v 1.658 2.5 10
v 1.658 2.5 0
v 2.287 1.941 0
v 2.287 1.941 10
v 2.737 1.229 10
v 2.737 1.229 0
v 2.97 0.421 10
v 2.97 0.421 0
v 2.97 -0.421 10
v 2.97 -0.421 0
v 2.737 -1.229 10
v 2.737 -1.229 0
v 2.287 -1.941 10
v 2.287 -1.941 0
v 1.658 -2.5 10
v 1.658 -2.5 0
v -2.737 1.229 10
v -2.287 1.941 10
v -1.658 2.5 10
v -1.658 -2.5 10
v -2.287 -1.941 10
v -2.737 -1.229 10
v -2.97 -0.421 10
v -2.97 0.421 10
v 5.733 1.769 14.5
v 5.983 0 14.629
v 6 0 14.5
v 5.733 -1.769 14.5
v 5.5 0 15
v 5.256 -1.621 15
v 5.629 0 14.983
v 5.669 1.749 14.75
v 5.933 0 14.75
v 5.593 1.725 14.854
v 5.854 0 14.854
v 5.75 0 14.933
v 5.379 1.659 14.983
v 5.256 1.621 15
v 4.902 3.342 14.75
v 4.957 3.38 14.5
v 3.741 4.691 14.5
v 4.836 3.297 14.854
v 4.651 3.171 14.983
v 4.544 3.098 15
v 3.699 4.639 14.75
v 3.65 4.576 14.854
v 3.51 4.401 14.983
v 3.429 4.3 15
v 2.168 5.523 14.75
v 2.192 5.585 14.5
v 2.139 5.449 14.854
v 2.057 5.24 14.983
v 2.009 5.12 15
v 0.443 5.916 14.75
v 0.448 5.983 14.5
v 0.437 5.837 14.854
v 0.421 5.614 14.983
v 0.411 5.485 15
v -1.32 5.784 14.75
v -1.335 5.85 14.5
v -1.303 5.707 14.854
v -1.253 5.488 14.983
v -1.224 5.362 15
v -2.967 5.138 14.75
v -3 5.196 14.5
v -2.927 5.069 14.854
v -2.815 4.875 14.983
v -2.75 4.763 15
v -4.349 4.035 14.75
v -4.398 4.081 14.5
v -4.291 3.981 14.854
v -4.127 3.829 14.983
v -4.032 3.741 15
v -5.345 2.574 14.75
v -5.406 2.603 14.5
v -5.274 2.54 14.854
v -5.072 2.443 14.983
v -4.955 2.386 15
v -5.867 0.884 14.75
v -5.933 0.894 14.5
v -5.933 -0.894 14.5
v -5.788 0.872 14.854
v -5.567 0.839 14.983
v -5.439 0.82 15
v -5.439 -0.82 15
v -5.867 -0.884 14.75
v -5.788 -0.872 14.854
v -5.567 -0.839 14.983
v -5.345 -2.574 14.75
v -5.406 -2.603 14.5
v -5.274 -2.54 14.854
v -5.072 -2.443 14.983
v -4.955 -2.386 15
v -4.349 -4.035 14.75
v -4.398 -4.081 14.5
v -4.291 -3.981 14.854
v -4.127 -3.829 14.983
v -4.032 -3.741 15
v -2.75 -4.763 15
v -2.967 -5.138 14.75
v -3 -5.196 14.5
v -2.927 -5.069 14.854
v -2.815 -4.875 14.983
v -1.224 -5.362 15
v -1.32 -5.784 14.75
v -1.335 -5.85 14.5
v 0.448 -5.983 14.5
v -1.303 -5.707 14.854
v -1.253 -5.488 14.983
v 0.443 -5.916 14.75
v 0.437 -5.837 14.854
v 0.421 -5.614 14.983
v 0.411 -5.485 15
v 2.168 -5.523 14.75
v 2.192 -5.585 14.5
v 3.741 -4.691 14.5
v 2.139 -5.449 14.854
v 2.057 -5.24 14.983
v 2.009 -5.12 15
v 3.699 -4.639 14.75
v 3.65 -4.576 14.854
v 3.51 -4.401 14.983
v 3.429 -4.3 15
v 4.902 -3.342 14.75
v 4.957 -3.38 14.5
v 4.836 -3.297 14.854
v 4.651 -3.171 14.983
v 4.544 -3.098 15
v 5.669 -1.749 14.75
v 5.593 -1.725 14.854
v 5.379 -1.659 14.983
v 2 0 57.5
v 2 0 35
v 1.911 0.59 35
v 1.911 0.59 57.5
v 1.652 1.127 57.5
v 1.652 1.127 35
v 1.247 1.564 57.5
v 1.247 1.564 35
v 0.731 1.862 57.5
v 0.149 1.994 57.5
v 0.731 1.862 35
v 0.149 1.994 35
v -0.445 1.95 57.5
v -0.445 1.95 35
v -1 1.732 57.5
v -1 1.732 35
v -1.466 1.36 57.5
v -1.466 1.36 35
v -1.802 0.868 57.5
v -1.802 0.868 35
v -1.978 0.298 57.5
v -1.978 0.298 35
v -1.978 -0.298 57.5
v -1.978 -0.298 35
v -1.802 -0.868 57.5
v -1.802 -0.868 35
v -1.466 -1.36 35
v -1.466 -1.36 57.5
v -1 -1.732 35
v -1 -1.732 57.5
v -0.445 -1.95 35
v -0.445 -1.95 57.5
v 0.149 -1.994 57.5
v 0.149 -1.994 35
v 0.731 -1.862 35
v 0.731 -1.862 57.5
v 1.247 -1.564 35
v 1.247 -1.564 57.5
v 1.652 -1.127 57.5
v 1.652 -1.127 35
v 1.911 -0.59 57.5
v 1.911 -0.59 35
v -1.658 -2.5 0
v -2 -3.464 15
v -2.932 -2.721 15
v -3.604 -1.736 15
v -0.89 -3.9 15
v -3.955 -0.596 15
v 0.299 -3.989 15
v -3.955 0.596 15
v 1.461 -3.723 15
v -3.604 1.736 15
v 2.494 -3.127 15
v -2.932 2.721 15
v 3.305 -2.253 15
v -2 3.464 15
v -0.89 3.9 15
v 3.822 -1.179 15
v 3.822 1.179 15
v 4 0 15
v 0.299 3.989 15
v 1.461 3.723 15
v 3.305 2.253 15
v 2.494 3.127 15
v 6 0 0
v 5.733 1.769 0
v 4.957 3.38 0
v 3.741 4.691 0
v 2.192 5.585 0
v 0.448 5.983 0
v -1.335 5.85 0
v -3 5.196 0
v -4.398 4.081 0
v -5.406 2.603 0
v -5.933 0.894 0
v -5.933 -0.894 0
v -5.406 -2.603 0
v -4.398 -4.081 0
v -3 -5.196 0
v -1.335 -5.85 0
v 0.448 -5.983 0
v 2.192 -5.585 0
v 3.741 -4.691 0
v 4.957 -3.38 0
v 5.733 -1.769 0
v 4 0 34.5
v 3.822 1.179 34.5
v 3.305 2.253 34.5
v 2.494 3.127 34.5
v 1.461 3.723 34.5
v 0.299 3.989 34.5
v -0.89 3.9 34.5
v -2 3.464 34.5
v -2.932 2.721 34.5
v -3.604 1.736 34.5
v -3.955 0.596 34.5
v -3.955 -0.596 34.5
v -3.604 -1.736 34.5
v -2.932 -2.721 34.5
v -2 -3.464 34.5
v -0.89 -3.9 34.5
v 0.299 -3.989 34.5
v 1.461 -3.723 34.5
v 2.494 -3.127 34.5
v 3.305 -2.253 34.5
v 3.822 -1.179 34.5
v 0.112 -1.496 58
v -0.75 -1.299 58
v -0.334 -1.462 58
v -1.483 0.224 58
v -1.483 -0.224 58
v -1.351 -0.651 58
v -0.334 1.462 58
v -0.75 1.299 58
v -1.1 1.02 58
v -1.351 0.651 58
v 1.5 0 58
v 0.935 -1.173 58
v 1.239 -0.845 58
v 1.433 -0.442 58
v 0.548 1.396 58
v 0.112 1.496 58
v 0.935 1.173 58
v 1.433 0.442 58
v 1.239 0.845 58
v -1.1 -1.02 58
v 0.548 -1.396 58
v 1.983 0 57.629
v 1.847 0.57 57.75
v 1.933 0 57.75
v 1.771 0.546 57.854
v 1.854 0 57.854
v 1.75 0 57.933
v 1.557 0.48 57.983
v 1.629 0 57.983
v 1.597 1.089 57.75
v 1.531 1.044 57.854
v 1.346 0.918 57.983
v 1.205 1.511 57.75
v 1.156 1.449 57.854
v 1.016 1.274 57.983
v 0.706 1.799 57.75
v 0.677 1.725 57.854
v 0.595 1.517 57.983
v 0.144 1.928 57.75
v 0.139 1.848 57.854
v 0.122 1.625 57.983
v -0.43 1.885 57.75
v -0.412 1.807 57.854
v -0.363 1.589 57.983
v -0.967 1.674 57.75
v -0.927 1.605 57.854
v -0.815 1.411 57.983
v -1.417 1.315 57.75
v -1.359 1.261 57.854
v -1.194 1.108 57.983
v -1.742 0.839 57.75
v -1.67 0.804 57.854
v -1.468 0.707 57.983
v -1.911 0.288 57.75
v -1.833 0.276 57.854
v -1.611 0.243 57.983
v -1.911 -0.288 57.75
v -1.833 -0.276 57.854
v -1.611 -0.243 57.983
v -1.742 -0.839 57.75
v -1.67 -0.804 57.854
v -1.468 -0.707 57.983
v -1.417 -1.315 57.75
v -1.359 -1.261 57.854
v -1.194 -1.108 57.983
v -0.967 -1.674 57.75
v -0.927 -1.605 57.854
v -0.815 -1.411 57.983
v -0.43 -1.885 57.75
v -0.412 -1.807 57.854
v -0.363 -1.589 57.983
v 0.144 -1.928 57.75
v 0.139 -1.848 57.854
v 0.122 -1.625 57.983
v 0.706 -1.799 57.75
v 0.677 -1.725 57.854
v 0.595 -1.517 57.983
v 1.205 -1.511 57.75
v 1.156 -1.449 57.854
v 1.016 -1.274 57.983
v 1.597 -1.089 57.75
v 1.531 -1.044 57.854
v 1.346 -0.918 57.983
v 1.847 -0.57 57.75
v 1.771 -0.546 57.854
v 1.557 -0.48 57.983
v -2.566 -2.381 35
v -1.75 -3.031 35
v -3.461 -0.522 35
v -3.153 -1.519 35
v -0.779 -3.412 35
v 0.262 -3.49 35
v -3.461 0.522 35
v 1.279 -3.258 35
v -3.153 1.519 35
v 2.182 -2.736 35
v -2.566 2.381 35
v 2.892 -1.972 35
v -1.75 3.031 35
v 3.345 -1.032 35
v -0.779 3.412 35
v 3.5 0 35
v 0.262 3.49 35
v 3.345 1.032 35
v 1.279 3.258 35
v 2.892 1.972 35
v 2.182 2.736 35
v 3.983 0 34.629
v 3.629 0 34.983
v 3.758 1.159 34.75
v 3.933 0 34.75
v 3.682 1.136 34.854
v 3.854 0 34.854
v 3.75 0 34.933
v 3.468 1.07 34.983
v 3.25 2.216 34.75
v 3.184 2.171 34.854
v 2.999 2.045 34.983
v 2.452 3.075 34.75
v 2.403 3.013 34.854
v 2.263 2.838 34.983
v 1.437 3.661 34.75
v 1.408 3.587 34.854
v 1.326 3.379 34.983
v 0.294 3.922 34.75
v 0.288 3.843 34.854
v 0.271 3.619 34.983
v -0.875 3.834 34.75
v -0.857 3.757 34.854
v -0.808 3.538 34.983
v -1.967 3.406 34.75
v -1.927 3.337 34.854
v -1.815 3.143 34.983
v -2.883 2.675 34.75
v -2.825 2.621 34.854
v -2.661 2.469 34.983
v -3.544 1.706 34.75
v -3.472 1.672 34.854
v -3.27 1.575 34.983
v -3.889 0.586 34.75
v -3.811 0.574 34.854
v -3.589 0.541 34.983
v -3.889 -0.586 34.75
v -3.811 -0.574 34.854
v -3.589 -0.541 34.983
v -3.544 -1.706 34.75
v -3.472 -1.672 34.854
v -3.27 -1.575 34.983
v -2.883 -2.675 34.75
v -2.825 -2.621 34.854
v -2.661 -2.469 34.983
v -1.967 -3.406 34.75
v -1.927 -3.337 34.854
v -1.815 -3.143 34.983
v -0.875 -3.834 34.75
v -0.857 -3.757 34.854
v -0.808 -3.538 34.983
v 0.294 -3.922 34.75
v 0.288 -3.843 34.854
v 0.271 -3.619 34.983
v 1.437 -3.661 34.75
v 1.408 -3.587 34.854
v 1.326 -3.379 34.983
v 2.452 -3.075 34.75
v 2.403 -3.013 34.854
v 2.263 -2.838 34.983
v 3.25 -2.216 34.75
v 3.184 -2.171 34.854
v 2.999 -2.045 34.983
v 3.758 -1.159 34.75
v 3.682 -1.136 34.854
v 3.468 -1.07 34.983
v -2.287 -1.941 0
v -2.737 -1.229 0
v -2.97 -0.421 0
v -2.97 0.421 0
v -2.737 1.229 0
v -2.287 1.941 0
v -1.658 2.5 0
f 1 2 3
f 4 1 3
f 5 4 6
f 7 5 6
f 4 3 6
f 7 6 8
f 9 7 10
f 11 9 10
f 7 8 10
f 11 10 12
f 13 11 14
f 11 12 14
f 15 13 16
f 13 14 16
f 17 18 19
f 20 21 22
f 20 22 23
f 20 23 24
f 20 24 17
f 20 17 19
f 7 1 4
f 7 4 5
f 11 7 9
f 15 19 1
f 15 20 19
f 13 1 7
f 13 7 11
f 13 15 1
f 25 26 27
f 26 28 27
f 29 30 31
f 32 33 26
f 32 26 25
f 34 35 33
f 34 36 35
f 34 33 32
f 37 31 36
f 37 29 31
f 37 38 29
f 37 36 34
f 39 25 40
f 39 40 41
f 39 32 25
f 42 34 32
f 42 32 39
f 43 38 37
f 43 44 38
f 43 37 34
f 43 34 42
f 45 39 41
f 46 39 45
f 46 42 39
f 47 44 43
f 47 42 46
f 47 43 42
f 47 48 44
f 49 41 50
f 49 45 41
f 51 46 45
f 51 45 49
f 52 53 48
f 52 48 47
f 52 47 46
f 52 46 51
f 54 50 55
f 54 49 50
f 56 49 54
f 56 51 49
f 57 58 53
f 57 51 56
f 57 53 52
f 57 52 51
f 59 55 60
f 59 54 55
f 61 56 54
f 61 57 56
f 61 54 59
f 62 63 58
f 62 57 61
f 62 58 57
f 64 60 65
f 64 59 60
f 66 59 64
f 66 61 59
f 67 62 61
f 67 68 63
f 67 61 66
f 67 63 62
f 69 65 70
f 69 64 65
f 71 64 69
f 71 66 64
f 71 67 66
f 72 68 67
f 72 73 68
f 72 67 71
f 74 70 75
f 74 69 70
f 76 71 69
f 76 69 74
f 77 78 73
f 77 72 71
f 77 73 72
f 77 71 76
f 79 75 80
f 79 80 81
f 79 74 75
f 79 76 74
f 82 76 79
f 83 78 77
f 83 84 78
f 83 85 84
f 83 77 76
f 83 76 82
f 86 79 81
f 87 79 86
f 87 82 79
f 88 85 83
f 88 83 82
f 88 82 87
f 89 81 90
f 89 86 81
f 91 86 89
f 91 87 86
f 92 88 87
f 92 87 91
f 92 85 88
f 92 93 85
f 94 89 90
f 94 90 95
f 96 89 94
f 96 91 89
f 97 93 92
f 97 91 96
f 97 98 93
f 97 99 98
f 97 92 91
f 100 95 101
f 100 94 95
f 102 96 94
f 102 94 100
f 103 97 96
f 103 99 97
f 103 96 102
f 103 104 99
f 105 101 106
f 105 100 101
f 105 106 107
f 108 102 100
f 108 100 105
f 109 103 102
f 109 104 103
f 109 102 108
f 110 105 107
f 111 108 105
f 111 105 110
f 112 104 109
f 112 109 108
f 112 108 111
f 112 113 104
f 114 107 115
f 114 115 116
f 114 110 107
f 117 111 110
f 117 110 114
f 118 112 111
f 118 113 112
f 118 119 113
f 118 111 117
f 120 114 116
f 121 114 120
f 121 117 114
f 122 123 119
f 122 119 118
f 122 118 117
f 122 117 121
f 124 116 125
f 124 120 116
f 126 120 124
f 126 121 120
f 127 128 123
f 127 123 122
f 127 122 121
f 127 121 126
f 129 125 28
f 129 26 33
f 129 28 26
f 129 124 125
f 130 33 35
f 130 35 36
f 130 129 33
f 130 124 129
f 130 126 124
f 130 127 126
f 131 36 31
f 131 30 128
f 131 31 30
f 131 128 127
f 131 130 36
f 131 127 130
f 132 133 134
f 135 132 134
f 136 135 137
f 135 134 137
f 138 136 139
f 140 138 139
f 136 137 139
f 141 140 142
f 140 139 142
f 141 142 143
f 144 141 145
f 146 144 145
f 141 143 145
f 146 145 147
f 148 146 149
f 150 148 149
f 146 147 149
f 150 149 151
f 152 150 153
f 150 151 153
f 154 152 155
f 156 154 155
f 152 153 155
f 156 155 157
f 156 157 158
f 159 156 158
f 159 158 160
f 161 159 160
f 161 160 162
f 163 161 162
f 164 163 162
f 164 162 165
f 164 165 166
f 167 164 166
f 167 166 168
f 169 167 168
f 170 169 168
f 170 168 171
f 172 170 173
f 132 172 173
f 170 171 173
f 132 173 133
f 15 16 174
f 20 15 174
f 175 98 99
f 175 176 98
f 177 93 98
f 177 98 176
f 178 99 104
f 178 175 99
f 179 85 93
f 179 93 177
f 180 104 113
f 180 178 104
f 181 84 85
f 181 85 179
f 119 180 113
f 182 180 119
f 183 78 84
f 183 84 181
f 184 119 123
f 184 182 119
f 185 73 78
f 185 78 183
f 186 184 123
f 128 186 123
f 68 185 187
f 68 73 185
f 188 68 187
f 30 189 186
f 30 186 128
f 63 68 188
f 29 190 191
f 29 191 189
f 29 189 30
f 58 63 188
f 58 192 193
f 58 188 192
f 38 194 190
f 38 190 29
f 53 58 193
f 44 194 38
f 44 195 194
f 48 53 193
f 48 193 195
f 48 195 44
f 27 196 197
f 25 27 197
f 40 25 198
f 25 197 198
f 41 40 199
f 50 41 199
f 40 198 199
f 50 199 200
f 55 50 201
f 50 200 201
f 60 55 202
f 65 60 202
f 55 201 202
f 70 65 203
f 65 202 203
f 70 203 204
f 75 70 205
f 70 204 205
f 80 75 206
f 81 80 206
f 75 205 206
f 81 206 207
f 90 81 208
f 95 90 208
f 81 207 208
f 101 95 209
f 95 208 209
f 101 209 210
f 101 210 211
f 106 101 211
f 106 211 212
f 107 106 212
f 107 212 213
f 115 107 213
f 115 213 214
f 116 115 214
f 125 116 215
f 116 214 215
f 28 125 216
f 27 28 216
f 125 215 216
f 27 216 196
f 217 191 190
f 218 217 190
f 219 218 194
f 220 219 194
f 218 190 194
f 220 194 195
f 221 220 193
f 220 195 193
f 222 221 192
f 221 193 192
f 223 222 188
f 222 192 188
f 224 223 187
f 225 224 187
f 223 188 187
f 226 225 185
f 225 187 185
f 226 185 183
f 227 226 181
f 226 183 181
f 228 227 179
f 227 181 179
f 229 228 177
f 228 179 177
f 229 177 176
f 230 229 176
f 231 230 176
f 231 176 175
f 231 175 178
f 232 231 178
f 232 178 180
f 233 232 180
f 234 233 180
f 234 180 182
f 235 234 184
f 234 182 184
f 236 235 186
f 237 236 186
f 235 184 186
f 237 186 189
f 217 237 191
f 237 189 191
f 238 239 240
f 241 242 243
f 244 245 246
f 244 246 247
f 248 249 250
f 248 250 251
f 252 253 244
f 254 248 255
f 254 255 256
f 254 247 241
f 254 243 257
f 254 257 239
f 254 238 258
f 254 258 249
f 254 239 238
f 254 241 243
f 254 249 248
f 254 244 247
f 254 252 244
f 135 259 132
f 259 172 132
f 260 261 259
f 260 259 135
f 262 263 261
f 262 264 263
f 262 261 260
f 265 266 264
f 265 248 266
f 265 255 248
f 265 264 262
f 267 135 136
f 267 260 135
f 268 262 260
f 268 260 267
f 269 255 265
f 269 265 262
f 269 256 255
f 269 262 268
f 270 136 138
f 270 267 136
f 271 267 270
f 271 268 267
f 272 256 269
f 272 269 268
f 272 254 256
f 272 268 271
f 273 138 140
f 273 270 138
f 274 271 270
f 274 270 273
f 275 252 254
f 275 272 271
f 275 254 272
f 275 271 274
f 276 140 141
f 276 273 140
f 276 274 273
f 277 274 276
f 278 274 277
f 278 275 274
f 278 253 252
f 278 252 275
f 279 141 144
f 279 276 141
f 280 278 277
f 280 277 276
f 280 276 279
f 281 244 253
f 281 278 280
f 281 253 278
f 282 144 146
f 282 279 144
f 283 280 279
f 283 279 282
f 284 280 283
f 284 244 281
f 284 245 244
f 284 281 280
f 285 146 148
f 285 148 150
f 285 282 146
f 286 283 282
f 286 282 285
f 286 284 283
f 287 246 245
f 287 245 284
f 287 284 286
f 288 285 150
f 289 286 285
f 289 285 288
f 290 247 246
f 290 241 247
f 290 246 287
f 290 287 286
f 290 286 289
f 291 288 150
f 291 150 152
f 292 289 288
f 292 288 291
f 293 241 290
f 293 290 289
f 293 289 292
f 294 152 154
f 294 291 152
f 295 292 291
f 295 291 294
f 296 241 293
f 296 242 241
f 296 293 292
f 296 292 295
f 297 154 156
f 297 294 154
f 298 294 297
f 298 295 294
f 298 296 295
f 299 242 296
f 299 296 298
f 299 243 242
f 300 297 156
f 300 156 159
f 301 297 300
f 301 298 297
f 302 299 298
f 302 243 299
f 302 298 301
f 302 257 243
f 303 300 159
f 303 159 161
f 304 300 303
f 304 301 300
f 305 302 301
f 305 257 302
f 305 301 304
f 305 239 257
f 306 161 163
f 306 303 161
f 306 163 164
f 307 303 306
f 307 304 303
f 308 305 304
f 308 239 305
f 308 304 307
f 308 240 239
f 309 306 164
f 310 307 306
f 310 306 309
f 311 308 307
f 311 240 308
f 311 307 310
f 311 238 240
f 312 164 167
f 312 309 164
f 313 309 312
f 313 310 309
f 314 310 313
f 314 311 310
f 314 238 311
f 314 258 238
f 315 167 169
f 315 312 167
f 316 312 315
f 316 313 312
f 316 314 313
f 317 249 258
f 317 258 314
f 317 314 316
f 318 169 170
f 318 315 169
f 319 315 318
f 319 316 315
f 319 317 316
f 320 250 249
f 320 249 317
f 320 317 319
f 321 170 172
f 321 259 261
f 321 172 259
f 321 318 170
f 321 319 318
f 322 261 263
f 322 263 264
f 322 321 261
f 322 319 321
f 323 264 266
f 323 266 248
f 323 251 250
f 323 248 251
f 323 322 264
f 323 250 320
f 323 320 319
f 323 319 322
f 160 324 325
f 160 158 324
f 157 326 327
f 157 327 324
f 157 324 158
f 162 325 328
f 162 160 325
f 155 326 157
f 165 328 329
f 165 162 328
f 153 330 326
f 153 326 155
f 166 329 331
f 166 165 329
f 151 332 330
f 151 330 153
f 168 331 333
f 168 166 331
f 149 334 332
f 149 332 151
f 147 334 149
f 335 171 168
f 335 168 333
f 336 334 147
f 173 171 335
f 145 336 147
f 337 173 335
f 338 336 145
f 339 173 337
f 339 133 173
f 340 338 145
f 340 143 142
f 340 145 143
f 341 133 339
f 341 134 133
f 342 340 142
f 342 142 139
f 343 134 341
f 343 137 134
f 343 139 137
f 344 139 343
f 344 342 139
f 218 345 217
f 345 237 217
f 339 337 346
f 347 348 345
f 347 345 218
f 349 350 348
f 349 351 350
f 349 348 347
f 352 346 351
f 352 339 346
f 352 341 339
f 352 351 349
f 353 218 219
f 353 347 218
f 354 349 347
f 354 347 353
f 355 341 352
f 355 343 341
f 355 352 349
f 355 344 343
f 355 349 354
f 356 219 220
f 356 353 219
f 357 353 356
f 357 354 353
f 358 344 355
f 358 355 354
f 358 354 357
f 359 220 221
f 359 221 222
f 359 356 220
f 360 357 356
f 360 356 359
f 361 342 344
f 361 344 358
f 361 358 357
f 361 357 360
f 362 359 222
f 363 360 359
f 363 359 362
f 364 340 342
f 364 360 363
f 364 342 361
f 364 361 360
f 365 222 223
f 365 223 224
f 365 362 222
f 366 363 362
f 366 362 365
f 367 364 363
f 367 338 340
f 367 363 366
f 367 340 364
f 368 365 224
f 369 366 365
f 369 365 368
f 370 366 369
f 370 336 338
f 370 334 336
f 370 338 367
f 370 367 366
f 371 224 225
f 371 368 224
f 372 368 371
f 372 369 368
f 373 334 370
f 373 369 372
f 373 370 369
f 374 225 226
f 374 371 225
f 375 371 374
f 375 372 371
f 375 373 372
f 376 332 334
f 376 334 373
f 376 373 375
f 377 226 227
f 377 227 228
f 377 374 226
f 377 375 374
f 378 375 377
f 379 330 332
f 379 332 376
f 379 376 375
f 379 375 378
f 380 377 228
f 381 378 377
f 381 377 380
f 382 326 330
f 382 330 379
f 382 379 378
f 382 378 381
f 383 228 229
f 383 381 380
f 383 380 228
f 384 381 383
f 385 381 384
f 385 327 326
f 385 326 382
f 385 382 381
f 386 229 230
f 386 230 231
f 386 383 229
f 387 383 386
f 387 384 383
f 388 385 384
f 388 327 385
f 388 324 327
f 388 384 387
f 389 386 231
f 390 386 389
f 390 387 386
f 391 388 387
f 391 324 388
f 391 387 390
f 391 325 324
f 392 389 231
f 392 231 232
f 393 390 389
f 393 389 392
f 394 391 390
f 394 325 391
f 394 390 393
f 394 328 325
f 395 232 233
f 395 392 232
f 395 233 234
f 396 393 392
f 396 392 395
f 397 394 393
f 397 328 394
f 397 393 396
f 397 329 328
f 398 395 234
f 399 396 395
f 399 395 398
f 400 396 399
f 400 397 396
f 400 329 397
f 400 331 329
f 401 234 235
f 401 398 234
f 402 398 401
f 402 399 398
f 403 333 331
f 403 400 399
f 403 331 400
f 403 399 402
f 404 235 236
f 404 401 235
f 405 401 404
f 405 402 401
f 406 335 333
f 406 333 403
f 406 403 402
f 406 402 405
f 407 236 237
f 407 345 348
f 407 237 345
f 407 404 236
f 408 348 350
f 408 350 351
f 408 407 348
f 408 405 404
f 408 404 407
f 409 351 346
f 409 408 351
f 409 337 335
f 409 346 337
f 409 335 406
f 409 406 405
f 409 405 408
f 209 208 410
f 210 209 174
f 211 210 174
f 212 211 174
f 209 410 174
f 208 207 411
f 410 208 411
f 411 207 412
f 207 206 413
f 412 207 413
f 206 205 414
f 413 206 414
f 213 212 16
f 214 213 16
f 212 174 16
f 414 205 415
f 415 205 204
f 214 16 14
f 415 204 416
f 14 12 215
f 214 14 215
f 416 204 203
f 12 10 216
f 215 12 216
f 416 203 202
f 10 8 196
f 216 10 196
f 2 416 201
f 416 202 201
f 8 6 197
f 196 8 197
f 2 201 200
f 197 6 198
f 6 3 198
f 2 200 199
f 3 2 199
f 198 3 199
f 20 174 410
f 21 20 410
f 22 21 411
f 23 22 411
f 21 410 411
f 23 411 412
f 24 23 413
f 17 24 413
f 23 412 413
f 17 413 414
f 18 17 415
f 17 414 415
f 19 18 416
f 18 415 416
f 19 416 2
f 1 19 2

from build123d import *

# Parameters (mm, degrees)
F0_R     = 6
F1_DEPTH = 15
F2_R     = 4
F3_DEPTH = 20
F4_R     = 2
F5_DEPTH = 23
F6_R     = 0.5
F8_DEPTH = 10


with BuildPart() as f1:
    # F0 (on Top) → F1 (new body)
    with BuildSketch(Plane.XY):
        Circle(F0_R)
    extrude(amount=F1_DEPTH)

    # F2 (on face) → F3 (join)
    with BuildSketch(Plane.XY.offset(15)):
        Circle(F2_R)
    extrude(amount=F3_DEPTH)

    # F4 (on face) → F5 (join)
    with BuildSketch(Plane.XY.offset(35)):
        Circle(F4_R)
    extrude(amount=F5_DEPTH)

    # F6
    f6_edges = [f1.edges().sort_by_distance(p)[0] for p in [
        (-4, 0, 35),
        (-6, 0, 15),
        (-2, 0, 58),
    ]]
    fillet(f6_edges, radius=F6_R)

    # F7 (on face) → F8 (cut)
    with BuildSketch(Plane(origin=(0, 0, 0), x_dir=(1, 0, 0), z_dir=(0, 0, -1))):
        with BuildLine():
            ThreePointArc((-1.658312, 2.5), (-3, 0), (-1.658312, -2.5))
            Line((-1.658312, -2.5), (1.658312, -2.5))
            ThreePointArc((1.658312, -2.5), (3, 0), (1.658312, 2.5))
            Line((1.658312, 2.5), (-1.658312, 2.5))
        make_face()
    extrude(amount=-F8_DEPTH, mode=Mode.SUBTRACT)


solid = f1.part
